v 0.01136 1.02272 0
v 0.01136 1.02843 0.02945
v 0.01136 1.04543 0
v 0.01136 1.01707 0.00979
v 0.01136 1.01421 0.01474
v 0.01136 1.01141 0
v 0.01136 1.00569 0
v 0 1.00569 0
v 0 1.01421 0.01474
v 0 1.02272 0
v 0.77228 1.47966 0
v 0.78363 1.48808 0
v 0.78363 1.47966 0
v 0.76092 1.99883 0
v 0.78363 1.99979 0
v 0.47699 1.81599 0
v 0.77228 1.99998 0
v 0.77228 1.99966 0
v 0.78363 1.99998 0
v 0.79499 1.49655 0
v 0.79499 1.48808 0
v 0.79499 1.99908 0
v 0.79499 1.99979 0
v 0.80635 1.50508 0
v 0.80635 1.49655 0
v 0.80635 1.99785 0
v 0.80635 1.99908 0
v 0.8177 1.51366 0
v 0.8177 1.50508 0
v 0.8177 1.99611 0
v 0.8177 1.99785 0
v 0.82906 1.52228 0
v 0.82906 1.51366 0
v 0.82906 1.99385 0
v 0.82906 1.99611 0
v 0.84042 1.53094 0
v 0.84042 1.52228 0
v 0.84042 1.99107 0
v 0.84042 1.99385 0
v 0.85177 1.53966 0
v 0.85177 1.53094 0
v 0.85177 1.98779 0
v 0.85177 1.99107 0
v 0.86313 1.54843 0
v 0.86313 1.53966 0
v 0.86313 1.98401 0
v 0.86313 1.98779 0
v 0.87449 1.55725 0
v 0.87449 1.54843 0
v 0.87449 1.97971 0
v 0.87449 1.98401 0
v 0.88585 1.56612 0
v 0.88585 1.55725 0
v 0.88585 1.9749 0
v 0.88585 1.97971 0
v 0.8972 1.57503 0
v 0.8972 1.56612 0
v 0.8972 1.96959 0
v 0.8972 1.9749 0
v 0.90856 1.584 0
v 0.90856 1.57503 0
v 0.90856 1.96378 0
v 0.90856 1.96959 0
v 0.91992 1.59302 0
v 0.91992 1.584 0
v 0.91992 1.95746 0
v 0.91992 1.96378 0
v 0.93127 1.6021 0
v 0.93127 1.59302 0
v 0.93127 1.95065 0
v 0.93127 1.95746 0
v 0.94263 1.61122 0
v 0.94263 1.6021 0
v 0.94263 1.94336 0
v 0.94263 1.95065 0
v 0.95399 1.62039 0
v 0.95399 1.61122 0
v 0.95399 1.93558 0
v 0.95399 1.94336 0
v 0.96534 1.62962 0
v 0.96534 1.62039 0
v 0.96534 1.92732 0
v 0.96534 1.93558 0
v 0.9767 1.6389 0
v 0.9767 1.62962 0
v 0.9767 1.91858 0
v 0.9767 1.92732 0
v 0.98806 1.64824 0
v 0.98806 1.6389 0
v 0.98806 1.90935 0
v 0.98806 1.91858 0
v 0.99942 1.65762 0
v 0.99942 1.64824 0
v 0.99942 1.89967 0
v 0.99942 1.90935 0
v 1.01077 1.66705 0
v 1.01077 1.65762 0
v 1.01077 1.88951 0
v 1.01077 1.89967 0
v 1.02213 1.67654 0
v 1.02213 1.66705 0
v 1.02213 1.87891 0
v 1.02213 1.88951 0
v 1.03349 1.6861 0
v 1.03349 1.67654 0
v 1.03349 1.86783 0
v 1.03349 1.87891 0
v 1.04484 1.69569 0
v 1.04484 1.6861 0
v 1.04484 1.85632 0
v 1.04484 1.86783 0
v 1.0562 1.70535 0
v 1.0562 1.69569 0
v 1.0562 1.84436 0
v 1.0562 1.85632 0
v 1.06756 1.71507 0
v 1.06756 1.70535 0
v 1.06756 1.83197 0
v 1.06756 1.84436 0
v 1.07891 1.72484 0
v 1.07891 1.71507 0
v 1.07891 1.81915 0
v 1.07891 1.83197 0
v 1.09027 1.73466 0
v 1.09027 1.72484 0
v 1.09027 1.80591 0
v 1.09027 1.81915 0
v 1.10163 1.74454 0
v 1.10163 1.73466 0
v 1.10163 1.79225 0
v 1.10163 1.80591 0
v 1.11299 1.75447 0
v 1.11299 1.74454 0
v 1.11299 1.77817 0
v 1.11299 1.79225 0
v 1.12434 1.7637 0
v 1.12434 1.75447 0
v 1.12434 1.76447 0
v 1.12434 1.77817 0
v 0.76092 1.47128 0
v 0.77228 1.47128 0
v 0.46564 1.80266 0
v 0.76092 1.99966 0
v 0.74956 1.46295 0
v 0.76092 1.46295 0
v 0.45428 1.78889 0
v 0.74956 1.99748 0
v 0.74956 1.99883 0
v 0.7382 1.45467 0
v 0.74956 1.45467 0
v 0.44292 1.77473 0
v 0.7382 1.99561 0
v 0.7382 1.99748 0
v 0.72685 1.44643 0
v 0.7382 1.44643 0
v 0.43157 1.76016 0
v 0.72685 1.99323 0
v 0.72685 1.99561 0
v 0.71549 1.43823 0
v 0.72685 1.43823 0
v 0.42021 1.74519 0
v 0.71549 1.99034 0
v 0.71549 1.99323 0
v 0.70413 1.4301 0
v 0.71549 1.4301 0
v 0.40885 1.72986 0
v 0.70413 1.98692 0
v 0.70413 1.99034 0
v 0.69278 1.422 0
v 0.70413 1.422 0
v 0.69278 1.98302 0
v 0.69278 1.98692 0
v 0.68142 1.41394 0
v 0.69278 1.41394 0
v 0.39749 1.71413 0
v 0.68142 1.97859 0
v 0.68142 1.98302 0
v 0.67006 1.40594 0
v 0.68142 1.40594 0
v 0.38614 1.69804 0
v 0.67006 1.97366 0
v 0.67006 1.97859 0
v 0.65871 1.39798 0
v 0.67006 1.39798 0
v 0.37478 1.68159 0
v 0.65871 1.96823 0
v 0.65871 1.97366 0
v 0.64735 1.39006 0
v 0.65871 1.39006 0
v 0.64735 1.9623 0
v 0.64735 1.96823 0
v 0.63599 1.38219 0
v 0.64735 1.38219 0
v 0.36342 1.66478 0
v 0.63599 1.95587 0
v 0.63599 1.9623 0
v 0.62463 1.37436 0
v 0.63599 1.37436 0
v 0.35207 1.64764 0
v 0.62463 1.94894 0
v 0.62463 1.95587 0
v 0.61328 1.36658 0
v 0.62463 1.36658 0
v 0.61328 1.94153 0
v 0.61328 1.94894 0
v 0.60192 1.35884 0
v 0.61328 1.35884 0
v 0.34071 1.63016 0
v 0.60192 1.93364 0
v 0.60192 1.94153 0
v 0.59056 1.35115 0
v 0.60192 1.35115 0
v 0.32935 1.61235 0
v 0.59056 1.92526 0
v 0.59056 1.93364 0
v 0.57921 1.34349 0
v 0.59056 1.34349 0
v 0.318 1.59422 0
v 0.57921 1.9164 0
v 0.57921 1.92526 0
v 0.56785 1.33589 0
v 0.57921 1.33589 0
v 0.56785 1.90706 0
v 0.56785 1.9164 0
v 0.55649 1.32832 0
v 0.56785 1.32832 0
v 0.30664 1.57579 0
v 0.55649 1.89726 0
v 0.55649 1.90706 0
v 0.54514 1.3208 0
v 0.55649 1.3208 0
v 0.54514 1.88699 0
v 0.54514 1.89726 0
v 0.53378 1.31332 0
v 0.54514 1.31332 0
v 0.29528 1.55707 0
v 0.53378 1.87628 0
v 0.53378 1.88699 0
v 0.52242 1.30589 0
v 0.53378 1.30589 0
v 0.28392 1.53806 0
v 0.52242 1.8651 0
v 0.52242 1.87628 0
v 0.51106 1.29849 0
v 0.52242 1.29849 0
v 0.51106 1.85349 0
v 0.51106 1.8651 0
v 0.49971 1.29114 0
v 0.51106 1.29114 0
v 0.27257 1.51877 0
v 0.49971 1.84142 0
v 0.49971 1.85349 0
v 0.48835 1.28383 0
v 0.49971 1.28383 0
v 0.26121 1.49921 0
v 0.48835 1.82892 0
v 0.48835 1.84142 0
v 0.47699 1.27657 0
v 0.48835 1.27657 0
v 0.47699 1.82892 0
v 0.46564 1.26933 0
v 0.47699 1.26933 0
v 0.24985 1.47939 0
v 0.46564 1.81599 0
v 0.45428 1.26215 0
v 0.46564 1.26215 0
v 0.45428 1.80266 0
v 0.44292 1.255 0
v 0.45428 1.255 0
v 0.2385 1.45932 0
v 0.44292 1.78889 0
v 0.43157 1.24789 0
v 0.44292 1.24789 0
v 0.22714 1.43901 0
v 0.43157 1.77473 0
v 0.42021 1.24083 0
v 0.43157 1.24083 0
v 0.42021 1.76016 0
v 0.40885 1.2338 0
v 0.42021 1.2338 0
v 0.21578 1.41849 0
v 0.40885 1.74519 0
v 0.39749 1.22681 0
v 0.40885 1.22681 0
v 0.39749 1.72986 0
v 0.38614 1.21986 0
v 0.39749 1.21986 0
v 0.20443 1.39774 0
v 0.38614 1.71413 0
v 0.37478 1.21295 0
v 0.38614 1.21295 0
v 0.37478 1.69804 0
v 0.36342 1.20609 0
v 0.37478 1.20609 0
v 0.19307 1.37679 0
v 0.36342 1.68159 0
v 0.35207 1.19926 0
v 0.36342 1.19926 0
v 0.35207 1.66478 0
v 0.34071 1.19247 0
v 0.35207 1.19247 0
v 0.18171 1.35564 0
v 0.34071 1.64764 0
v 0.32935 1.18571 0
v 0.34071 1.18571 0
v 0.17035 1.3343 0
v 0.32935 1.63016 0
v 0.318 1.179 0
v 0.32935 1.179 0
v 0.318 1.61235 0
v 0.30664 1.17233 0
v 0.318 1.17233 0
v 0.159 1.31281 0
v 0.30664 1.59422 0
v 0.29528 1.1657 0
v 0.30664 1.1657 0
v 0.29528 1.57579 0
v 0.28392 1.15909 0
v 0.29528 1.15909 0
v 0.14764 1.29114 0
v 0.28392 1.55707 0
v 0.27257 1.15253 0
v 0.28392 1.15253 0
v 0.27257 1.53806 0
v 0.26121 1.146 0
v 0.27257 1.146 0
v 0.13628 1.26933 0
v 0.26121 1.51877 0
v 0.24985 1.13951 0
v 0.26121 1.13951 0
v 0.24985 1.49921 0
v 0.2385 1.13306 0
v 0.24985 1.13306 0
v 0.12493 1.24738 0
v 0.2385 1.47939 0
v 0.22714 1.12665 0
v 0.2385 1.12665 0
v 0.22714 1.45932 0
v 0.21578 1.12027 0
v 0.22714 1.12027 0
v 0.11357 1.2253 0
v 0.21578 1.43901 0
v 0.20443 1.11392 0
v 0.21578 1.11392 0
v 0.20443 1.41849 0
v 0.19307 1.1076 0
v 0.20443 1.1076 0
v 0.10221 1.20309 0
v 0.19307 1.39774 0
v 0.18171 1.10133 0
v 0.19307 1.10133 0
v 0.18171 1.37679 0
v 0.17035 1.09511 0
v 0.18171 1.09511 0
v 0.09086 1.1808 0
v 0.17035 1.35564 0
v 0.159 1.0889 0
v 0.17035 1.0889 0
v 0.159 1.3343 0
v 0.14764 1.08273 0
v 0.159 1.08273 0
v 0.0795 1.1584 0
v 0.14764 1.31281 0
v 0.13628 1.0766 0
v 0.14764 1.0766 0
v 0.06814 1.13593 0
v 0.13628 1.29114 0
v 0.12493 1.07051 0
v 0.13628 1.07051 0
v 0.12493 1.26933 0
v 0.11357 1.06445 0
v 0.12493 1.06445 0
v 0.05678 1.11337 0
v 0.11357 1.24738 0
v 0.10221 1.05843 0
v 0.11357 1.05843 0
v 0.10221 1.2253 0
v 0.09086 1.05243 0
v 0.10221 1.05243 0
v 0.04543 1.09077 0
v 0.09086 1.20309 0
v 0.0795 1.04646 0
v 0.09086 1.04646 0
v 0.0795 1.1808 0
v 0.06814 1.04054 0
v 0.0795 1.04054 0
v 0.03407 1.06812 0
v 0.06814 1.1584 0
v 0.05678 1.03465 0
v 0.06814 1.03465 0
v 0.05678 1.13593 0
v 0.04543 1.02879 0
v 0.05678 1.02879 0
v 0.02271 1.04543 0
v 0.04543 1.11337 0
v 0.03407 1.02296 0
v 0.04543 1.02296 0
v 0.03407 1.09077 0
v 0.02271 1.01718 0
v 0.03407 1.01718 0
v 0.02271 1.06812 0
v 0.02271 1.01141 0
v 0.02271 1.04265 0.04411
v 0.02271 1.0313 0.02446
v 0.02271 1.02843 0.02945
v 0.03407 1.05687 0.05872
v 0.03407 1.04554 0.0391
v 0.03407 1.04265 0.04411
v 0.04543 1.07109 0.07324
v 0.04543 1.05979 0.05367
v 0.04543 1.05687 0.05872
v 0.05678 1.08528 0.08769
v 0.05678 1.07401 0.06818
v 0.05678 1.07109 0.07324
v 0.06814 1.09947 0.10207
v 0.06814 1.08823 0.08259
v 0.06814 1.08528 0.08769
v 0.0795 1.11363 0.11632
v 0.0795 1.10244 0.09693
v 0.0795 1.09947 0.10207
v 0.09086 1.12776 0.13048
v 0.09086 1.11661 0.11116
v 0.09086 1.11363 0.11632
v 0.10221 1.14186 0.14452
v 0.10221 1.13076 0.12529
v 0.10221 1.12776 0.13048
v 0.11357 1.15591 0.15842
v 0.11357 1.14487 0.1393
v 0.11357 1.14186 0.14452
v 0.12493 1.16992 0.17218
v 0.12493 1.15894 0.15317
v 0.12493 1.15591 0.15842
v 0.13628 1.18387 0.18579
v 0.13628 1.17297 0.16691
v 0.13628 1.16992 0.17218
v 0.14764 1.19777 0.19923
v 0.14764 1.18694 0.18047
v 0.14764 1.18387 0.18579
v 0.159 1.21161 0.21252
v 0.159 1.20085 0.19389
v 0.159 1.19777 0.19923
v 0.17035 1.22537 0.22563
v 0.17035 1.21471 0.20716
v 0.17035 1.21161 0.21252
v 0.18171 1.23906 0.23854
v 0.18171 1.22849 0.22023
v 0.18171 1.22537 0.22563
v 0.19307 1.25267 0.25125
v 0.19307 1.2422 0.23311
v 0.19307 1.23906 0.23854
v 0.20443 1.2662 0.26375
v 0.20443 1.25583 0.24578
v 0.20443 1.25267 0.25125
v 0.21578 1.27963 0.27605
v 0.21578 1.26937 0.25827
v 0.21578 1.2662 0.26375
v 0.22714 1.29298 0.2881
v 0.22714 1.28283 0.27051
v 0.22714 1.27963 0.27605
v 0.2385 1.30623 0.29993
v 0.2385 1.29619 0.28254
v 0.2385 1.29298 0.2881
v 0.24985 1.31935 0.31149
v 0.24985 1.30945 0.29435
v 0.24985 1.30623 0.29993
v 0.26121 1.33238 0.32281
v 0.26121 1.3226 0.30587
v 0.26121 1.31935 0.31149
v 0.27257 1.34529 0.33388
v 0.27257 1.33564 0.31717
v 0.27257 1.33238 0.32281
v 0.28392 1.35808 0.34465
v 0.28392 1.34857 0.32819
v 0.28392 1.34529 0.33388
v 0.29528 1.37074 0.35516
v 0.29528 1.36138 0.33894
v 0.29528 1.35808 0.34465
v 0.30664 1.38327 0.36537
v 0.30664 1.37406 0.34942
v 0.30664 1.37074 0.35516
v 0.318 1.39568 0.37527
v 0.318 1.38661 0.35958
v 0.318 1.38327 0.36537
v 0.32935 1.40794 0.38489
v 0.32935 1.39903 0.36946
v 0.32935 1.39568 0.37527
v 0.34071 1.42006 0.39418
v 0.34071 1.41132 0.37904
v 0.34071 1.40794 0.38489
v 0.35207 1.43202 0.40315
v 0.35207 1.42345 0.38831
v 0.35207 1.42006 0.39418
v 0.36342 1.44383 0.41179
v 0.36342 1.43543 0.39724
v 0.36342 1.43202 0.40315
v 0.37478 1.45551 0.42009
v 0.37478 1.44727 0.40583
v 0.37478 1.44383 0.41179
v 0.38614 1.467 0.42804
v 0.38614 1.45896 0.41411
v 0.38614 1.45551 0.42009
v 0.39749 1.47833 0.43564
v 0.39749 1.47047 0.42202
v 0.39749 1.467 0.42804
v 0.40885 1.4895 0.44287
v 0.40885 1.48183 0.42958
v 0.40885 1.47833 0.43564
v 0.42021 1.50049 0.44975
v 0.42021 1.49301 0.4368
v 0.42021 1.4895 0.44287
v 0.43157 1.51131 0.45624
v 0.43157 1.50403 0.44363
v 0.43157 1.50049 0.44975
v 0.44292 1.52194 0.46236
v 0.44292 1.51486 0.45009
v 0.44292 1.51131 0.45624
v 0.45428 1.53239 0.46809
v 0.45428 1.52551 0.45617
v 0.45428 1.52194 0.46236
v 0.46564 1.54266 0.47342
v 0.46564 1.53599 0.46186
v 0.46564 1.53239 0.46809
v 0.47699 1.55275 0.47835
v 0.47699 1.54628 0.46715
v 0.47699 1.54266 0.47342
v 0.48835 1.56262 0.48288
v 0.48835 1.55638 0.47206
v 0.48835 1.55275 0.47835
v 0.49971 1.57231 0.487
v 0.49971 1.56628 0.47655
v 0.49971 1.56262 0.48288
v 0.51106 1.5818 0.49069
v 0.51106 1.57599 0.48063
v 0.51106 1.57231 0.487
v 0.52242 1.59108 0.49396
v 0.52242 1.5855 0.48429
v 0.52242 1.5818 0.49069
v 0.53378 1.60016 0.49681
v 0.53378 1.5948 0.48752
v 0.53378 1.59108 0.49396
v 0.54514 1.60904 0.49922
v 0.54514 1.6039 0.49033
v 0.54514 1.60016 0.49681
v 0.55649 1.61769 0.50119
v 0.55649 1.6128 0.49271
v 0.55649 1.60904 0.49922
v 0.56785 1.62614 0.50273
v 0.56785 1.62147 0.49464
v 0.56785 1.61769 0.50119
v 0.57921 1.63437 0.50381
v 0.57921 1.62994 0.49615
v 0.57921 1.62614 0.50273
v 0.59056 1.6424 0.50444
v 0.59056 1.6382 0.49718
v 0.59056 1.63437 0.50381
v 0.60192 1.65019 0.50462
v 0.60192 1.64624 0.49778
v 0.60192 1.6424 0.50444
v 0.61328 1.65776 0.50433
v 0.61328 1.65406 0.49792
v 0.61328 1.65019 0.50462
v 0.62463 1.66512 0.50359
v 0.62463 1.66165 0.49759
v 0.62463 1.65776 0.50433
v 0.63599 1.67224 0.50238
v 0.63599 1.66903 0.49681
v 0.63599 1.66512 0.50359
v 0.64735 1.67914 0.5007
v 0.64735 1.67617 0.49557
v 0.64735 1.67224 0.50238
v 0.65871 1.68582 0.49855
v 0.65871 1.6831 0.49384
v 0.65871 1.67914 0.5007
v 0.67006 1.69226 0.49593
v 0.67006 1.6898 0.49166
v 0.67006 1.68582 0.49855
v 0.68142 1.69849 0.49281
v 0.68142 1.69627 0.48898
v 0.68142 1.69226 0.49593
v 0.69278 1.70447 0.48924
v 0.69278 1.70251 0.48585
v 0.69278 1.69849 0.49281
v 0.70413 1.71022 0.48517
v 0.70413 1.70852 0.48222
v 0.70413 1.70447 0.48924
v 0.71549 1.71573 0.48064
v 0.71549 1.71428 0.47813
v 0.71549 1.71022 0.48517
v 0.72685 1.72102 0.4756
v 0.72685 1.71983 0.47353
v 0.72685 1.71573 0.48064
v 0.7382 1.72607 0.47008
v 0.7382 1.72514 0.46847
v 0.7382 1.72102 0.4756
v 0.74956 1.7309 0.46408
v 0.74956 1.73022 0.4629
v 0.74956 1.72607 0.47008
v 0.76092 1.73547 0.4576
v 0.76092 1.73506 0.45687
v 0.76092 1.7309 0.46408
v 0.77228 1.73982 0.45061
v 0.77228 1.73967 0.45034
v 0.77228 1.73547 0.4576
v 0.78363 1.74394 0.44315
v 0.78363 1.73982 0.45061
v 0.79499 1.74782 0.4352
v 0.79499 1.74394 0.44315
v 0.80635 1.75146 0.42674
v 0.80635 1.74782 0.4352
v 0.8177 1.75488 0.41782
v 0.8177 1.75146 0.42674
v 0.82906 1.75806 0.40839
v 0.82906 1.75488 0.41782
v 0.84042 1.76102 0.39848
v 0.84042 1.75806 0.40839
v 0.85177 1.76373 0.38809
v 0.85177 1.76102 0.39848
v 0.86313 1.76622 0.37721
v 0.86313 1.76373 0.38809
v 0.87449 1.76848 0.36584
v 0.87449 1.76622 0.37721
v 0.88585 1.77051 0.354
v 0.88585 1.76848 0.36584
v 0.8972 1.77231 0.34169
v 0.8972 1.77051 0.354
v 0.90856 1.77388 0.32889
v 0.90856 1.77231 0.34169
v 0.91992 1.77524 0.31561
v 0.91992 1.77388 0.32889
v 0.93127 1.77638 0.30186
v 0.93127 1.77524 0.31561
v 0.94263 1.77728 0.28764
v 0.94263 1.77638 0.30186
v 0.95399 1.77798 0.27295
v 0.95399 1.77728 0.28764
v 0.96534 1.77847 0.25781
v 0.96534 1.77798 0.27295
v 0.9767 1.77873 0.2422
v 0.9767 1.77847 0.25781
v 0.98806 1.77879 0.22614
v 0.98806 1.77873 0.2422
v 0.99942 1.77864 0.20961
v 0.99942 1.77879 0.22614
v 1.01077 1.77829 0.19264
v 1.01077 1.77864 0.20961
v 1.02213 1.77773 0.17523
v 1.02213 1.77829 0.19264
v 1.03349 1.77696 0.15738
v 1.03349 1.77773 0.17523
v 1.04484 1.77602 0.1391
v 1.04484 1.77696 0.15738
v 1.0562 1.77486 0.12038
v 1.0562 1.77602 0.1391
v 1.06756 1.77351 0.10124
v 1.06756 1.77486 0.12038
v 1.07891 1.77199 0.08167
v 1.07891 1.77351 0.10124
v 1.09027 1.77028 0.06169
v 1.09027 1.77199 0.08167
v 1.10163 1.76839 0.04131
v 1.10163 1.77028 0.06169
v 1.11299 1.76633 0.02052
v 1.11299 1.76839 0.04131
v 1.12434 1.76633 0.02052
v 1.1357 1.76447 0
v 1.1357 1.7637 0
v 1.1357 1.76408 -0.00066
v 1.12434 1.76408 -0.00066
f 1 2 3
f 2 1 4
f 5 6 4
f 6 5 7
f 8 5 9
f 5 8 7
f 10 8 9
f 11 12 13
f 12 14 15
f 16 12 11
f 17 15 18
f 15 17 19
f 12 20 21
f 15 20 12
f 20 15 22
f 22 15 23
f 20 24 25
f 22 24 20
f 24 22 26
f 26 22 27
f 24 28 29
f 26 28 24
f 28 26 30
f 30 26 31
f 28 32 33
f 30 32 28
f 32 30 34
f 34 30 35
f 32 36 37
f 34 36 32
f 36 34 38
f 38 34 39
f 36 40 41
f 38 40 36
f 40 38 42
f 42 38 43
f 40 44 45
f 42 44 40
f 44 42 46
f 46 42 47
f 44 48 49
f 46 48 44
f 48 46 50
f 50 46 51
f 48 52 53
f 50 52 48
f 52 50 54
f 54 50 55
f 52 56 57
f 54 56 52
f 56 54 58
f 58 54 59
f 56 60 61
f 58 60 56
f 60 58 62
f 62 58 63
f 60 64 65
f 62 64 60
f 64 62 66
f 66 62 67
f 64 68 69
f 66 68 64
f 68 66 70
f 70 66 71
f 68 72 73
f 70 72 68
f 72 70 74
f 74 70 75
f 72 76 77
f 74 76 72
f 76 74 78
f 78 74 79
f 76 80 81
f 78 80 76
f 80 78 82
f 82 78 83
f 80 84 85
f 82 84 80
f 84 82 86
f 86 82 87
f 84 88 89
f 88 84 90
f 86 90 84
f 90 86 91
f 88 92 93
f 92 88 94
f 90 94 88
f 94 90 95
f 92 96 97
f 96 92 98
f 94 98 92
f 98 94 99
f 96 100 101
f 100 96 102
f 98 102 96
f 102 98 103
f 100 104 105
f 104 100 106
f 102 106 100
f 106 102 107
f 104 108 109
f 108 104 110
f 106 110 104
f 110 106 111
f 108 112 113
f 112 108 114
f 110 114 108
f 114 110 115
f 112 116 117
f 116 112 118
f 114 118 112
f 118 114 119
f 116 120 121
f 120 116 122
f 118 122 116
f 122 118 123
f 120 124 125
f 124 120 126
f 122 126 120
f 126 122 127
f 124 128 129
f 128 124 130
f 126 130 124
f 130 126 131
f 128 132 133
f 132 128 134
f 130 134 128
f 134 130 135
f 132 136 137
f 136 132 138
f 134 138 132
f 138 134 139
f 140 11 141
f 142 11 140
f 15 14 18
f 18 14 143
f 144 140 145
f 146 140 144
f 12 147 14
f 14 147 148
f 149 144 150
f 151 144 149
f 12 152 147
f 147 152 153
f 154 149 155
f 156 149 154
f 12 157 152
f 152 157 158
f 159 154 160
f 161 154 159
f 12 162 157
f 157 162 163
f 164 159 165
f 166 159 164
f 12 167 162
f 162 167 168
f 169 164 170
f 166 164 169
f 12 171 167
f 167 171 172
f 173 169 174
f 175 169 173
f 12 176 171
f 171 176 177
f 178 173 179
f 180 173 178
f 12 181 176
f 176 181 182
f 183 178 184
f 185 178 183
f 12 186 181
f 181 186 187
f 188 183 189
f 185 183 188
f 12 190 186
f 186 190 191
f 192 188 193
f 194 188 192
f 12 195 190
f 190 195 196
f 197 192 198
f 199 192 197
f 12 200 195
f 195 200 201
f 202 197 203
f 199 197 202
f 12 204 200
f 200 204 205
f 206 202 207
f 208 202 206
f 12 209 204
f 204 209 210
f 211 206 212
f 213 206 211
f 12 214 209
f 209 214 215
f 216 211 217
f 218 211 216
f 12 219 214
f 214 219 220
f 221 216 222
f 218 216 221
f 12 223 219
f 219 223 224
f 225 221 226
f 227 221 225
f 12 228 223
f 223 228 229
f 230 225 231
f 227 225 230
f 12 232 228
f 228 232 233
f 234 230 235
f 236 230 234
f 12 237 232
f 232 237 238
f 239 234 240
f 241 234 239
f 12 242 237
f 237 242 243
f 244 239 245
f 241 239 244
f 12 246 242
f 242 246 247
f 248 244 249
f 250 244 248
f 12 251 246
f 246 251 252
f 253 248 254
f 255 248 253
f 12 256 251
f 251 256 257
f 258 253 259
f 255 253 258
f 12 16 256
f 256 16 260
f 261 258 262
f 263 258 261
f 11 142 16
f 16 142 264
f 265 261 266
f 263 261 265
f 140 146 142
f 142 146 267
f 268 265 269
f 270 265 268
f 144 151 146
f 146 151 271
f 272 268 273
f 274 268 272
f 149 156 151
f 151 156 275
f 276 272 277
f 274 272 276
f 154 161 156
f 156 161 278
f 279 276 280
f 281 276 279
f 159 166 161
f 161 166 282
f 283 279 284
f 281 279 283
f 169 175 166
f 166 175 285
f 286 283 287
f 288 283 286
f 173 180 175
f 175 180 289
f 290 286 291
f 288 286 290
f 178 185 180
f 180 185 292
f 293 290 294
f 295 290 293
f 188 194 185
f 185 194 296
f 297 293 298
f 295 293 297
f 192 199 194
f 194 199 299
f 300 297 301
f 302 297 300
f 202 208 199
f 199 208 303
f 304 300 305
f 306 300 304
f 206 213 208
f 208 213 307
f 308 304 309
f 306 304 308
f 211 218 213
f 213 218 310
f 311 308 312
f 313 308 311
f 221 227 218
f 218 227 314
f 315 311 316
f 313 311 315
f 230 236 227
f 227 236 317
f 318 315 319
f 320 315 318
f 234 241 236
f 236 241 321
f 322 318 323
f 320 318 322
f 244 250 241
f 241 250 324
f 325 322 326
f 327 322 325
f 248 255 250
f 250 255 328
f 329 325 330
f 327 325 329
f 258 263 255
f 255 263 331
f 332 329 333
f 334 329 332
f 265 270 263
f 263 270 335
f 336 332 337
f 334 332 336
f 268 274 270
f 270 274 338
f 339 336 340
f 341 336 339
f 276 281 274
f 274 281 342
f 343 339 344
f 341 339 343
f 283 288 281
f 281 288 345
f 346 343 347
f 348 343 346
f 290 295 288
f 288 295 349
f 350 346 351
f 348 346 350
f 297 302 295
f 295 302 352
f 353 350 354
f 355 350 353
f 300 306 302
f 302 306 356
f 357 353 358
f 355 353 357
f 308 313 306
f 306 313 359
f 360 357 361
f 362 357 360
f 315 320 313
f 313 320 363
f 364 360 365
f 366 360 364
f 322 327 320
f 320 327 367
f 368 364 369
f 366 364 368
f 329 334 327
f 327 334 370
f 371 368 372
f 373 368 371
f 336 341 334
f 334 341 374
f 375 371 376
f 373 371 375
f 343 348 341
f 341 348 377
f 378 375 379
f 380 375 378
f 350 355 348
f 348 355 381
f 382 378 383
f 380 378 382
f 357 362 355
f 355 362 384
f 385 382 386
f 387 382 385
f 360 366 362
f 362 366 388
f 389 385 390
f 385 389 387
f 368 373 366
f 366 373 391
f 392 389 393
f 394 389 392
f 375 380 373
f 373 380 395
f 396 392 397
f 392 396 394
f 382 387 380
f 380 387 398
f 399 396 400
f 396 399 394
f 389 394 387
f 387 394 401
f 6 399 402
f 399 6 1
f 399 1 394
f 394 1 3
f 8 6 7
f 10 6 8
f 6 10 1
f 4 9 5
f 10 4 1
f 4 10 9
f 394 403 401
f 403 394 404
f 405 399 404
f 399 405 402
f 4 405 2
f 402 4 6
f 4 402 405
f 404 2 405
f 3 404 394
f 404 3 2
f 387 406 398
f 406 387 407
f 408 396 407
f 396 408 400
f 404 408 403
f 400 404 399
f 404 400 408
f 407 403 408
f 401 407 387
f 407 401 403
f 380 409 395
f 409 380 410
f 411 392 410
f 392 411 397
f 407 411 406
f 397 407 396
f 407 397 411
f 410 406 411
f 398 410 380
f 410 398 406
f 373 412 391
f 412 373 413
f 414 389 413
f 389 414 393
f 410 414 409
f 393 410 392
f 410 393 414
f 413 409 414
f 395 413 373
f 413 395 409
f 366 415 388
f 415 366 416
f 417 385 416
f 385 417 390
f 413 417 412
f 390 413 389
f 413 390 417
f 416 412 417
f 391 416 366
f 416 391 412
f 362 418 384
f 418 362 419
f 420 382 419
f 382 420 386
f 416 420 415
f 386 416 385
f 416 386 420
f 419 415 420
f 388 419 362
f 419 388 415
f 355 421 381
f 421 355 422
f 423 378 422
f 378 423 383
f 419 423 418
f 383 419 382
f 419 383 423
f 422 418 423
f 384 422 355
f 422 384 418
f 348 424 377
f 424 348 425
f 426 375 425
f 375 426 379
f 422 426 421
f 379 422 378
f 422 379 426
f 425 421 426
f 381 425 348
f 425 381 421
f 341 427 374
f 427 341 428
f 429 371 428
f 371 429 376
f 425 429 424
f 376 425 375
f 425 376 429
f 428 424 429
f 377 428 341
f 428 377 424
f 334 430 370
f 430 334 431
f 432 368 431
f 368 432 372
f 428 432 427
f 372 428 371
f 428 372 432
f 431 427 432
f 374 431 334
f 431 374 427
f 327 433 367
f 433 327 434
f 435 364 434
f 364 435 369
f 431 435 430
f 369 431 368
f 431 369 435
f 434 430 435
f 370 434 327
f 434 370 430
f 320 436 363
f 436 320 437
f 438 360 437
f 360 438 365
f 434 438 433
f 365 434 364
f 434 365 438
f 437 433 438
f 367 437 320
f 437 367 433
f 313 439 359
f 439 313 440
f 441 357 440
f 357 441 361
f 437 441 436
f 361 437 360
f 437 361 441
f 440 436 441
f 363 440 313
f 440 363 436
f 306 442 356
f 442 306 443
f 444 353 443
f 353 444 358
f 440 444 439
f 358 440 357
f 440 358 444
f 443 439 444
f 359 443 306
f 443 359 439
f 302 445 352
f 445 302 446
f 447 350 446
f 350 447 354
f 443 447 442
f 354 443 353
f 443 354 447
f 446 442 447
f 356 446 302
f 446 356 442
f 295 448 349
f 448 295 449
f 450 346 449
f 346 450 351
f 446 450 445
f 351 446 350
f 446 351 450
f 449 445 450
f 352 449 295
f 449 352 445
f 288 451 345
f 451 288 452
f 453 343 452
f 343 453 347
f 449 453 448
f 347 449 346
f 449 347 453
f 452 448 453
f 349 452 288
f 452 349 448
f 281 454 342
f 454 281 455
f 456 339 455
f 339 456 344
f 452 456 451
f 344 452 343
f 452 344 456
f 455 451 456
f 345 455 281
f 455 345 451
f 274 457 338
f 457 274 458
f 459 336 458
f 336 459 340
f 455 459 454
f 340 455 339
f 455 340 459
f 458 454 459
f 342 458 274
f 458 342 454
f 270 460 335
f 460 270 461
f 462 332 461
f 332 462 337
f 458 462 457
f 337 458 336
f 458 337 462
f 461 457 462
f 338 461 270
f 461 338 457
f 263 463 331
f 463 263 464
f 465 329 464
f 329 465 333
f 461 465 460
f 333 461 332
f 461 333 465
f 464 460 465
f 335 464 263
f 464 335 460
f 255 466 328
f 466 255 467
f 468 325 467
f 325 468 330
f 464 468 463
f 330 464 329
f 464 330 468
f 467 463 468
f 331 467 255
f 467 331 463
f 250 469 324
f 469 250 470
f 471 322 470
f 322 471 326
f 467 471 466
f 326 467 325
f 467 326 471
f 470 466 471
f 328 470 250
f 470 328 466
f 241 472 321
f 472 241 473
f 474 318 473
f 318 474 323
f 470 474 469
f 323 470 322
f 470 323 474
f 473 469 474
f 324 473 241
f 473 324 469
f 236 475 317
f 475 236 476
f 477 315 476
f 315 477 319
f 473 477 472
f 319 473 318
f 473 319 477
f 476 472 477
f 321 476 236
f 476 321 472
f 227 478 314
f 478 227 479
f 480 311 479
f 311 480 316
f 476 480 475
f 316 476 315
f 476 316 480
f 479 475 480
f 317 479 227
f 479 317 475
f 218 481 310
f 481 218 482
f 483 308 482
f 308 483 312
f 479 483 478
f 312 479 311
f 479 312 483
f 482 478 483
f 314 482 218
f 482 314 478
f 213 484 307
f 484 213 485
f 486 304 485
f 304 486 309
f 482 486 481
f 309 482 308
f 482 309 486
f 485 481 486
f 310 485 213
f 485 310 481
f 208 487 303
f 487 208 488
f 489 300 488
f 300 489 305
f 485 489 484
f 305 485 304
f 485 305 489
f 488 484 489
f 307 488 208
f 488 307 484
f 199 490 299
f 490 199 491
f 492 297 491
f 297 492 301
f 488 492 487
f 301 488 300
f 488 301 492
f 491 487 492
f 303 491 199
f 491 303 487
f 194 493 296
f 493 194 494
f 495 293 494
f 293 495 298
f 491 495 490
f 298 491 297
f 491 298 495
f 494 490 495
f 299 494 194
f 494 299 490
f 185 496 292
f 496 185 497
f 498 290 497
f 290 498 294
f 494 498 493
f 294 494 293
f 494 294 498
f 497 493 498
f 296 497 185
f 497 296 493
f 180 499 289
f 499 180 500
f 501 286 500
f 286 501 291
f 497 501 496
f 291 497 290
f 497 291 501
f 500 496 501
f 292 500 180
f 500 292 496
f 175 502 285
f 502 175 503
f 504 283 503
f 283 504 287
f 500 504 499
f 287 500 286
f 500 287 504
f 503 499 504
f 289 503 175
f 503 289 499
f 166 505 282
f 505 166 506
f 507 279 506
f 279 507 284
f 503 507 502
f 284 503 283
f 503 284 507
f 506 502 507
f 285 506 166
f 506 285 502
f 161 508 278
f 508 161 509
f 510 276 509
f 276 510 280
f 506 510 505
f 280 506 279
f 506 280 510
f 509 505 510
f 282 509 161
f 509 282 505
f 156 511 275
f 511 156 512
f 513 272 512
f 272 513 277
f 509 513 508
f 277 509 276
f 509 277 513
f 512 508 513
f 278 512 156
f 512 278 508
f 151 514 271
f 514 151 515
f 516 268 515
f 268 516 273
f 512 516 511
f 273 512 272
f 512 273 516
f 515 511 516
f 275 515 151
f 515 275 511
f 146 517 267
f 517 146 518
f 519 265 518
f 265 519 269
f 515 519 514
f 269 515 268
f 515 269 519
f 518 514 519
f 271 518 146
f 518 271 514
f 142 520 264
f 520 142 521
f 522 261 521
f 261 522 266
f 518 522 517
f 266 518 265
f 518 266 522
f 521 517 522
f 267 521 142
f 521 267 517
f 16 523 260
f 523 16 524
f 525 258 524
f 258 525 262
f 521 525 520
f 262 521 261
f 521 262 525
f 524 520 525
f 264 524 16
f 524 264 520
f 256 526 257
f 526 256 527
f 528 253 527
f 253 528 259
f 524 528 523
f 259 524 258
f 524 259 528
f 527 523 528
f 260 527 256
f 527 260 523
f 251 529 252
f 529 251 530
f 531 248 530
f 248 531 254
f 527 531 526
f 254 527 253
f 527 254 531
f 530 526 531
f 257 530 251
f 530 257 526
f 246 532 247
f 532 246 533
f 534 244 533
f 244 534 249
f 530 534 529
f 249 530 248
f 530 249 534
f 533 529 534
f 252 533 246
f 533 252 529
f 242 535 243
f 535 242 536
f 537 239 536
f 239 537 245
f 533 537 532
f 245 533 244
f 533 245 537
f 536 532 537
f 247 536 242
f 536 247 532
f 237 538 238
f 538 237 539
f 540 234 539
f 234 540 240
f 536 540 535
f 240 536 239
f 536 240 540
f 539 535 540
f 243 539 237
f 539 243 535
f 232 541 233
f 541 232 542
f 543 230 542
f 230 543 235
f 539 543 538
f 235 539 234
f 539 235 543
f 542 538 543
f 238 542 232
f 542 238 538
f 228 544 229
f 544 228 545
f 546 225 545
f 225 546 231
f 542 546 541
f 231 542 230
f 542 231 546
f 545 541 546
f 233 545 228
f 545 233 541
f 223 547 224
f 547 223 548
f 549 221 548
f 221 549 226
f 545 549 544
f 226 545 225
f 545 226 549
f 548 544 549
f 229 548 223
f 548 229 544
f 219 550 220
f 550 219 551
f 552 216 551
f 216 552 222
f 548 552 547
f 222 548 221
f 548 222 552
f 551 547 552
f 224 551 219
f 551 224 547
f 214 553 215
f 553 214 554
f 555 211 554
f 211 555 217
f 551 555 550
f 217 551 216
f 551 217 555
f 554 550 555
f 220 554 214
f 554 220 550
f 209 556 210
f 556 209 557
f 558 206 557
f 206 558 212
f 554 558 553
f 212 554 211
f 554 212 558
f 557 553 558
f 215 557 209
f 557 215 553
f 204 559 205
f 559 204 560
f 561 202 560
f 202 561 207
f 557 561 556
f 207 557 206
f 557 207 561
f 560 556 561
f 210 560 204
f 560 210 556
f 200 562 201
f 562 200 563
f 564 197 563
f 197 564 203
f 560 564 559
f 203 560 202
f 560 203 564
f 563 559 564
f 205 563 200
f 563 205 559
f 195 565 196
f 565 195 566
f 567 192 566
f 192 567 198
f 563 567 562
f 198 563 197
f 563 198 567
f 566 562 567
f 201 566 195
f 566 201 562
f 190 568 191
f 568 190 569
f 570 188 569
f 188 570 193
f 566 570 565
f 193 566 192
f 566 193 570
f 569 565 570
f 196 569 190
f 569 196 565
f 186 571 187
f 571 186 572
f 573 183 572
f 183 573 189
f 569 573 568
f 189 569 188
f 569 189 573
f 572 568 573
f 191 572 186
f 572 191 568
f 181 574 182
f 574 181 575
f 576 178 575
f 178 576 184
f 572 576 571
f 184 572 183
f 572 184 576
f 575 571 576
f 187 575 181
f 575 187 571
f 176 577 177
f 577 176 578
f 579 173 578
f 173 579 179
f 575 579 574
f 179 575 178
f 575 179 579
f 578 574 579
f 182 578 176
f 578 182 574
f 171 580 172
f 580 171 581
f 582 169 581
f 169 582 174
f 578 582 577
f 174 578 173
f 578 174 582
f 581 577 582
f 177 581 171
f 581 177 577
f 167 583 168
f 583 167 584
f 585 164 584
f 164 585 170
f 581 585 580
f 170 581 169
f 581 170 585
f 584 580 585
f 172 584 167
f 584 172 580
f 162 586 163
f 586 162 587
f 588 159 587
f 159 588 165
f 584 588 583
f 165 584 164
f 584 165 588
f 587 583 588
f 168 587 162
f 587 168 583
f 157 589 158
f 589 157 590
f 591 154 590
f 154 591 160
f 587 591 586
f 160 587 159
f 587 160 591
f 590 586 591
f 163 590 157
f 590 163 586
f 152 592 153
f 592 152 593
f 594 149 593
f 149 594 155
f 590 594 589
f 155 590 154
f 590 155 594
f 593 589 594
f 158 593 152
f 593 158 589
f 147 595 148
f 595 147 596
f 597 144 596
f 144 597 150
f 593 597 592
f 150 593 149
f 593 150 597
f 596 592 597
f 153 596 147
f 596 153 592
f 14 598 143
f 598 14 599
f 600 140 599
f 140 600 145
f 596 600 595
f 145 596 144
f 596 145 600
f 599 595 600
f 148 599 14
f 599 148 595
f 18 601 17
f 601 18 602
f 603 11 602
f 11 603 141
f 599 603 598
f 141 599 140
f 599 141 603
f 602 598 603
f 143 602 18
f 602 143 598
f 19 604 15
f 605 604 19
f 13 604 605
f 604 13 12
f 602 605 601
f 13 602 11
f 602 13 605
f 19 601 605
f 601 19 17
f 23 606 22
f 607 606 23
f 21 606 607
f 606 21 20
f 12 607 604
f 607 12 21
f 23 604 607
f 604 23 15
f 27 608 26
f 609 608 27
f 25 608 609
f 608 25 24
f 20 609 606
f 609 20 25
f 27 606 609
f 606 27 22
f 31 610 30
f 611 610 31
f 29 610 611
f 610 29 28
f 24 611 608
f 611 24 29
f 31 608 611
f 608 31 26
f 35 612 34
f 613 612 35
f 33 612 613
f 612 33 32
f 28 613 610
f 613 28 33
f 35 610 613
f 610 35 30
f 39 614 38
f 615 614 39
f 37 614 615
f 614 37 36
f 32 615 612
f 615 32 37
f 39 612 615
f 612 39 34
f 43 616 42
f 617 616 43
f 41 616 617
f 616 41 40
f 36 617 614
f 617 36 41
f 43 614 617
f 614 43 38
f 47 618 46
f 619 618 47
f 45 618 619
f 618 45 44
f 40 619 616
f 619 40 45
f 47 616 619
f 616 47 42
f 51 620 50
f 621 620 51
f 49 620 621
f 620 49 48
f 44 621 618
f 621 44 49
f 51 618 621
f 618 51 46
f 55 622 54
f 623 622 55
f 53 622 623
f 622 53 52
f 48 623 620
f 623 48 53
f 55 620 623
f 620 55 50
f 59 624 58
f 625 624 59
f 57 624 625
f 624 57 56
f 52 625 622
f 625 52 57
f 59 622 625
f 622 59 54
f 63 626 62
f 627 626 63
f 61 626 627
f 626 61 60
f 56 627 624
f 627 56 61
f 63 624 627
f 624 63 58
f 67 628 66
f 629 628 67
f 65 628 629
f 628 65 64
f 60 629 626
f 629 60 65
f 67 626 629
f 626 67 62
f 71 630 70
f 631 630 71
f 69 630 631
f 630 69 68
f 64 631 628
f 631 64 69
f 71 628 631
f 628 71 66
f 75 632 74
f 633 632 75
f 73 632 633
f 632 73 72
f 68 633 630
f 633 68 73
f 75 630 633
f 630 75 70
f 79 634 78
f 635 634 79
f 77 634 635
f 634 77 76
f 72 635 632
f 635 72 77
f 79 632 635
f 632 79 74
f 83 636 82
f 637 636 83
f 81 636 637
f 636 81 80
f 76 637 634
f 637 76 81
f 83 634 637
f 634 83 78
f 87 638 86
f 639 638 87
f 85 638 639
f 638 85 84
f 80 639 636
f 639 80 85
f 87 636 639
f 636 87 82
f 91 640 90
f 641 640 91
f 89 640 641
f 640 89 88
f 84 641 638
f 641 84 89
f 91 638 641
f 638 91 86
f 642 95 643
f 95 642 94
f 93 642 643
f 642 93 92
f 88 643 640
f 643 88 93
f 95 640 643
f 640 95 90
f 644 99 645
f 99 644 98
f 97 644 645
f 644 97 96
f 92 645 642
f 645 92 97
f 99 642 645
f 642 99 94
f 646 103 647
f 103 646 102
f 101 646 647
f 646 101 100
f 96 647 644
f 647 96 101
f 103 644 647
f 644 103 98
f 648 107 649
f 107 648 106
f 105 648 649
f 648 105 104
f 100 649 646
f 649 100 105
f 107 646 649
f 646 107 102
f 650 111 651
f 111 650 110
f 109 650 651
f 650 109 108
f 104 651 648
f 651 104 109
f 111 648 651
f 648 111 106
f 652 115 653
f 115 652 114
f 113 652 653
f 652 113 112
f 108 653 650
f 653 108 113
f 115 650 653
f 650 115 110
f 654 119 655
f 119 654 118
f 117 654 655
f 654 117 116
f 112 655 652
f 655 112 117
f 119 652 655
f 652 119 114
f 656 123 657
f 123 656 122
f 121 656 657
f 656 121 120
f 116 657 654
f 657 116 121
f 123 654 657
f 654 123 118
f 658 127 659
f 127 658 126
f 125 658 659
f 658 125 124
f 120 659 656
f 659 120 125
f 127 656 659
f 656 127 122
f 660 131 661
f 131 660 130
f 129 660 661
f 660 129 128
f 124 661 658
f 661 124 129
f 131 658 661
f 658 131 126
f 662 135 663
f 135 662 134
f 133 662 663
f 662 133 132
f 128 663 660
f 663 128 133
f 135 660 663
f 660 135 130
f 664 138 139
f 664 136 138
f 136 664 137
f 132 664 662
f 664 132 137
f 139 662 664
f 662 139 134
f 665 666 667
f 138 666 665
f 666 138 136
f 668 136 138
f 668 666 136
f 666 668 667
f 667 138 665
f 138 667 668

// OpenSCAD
// Make circles smooth
$fn=200;

// function for curves
function f(x) = 1+sin(2*x*180/3.14);
function g(x) = exp(x/2);
a = 0;
b = 1.1357;

// functions for circles
//function f(x) = sqrt(1- pow(x,2));
//function g(x) = -f(x);
//a = -1;
//b = 1;

//function f(x) = sqrt(x) + 4;
//function g(x) = -sqrt(x) + 4;
//a = 0;
//b = 16;

triangles(a,b,100);

// Don't edit under this line
// -----------------------------------------------------------------------------
// -----------------------------------------------------------------------------
// -----------------------------------------------------------------------------

module triangles(a=0, b=1, steps=10) {
    // Determine step size
    step_size = (b-a)/steps;
    sqrt_3 = 1.732050;
    
    function height(b) = ((sqrt_3/2)*b);
    
    union() {
        for(x = [a:step_size:b]) {
            points = [
                [0,f(x)],
                [0,g(x)],
                [height(f(x)-g(x)),(f(x)-g(x))/2+g(x)]
            ];
            translate([x,0,0])rotate([0,-90,0])linear_extrude(step_size)polygon(points);
        }
    }
}
